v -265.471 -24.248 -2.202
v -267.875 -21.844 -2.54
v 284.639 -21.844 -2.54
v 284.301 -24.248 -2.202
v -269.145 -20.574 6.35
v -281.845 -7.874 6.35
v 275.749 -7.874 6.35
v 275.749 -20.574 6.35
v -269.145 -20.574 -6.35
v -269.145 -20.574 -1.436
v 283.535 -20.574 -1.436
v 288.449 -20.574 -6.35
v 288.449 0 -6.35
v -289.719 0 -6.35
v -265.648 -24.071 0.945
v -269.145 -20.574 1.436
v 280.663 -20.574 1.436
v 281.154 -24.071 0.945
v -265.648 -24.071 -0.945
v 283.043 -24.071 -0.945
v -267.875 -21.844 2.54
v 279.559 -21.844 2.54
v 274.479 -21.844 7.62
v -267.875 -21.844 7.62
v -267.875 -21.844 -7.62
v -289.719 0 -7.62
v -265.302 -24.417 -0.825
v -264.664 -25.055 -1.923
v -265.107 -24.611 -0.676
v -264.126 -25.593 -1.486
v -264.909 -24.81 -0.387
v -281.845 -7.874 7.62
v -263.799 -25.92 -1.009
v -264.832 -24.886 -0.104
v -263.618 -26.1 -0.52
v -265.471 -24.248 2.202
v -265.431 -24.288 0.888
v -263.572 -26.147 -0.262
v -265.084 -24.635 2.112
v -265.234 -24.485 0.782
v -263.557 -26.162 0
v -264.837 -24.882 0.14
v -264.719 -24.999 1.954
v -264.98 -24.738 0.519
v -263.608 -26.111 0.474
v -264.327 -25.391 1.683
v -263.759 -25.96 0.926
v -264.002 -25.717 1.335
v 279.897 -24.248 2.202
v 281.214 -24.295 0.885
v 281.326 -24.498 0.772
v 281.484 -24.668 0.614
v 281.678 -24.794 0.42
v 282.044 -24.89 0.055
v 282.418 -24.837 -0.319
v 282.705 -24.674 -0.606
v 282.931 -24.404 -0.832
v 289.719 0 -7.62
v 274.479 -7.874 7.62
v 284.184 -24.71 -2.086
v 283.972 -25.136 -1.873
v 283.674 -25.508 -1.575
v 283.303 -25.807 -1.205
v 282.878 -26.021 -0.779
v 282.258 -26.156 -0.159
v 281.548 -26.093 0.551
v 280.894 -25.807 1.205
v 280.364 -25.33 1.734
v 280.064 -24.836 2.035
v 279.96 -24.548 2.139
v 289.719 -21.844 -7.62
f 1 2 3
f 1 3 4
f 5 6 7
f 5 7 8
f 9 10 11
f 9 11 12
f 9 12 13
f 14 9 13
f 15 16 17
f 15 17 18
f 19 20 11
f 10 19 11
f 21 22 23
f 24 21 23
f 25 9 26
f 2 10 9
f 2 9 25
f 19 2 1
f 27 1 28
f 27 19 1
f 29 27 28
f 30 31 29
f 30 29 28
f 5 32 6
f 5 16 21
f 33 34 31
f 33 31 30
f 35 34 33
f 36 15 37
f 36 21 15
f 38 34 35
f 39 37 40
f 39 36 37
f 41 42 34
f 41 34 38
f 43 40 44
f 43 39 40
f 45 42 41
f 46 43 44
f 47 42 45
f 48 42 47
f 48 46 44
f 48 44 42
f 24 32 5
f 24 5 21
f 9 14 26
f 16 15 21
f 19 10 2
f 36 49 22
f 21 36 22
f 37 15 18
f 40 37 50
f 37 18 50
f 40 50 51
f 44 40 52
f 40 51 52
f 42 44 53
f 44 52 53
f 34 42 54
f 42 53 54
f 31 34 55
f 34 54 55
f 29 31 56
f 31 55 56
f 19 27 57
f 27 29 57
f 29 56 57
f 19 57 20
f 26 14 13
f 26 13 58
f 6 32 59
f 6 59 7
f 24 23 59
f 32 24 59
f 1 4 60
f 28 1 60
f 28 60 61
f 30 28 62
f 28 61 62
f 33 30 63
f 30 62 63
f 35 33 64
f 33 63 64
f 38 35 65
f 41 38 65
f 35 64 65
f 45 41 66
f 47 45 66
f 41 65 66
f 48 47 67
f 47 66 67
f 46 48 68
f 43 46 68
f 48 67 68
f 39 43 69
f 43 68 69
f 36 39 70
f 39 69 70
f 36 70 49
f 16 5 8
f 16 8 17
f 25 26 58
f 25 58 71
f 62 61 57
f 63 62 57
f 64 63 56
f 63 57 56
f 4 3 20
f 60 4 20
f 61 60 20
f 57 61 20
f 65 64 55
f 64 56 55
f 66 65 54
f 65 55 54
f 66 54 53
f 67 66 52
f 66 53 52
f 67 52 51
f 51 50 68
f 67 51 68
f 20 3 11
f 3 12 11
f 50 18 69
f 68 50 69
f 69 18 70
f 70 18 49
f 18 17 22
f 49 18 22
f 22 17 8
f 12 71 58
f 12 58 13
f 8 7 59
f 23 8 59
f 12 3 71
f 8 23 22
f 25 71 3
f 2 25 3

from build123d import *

# Parameters (mm, degrees)
BOSS_EXTRUDE1_DEPTH         = 289.71875
CUT_TOP_RIGHT_FRONT_DEPTH   = 27.162
CUT_FRONT_LEFT_BOTTOM_DEPTH = 16.24


with BuildPart() as part:
    # Sketch1 → Boss-Extrude1 (new body, symmetric)
    with BuildSketch(Plane(origin=(0, 0, 0), x_dir=(0, 0, -1), z_dir=(1, 0, 0))):
        with BuildLine():
            Line((7.62, 0), (7.62, -21.844))
            Line((7.62, -21.844), (2.54, -21.844))
            Line((2.54, -21.844), (2.202186415, -24.247668555))
            ThreePointArc((2.202186415, -24.247668555), (0, -26.162), (-2.202186415, -24.247668555))
            Line((-2.202186415, -24.247668555), (-2.54, -21.844))
            Line((-2.54, -21.844), (-7.62, -21.844))
            Line((-7.62, -21.844), (-7.62, -7.874))
            Line((-7.62, -7.874), (-6.35, -7.874))
            Line((-6.35, -7.874), (-6.35, -20.574))
            Line((-6.35, -20.574), (-1.436005843, -20.574))
            Line((-1.436005843, -20.574), (-0.944545968, -24.070918717))
            ThreePointArc((-0.944545968, -24.070918717), (0, -24.892), (0.944545968, -24.070918717))
            Line((0.944545968, -24.070918717), (1.436005843, -20.574))
            Line((1.436005843, -20.574), (6.35, -20.574))
            Line((6.35, -20.574), (6.35, 0))
            Line((6.35, 0), (7.62, 0))
        make_face()
    extrude(amount=BOSS_EXTRUDE1_DEPTH, both=True)

    # Sketch2 → Cut-Top-Right-Front (cut, through all)
    with BuildSketch(Plane(origin=(0, 0, 0), x_dir=(1, 0, 0), z_dir=(0, 1, 0))):
        Polygon((289.71875, 7.62), (274.47875, -7.62), (289.71875, -7.62), align=None)
    extrude(amount=-CUT_TOP_RIGHT_FRONT_DEPTH, mode=Mode.SUBTRACT)

    # Sketch12 → Cut-Front-Left-Bottom (cut, through all)
    with BuildSketch(Plane.XY.offset(7.62)):
        Polygon((-289.71875, 0), (-263.55675, -26.162), (-289.71875, -26.162), align=None)
    extrude(amount=-CUT_FRONT_LEFT_BOTTOM_DEPTH, mode=Mode.SUBTRACT)


solid = part.part
